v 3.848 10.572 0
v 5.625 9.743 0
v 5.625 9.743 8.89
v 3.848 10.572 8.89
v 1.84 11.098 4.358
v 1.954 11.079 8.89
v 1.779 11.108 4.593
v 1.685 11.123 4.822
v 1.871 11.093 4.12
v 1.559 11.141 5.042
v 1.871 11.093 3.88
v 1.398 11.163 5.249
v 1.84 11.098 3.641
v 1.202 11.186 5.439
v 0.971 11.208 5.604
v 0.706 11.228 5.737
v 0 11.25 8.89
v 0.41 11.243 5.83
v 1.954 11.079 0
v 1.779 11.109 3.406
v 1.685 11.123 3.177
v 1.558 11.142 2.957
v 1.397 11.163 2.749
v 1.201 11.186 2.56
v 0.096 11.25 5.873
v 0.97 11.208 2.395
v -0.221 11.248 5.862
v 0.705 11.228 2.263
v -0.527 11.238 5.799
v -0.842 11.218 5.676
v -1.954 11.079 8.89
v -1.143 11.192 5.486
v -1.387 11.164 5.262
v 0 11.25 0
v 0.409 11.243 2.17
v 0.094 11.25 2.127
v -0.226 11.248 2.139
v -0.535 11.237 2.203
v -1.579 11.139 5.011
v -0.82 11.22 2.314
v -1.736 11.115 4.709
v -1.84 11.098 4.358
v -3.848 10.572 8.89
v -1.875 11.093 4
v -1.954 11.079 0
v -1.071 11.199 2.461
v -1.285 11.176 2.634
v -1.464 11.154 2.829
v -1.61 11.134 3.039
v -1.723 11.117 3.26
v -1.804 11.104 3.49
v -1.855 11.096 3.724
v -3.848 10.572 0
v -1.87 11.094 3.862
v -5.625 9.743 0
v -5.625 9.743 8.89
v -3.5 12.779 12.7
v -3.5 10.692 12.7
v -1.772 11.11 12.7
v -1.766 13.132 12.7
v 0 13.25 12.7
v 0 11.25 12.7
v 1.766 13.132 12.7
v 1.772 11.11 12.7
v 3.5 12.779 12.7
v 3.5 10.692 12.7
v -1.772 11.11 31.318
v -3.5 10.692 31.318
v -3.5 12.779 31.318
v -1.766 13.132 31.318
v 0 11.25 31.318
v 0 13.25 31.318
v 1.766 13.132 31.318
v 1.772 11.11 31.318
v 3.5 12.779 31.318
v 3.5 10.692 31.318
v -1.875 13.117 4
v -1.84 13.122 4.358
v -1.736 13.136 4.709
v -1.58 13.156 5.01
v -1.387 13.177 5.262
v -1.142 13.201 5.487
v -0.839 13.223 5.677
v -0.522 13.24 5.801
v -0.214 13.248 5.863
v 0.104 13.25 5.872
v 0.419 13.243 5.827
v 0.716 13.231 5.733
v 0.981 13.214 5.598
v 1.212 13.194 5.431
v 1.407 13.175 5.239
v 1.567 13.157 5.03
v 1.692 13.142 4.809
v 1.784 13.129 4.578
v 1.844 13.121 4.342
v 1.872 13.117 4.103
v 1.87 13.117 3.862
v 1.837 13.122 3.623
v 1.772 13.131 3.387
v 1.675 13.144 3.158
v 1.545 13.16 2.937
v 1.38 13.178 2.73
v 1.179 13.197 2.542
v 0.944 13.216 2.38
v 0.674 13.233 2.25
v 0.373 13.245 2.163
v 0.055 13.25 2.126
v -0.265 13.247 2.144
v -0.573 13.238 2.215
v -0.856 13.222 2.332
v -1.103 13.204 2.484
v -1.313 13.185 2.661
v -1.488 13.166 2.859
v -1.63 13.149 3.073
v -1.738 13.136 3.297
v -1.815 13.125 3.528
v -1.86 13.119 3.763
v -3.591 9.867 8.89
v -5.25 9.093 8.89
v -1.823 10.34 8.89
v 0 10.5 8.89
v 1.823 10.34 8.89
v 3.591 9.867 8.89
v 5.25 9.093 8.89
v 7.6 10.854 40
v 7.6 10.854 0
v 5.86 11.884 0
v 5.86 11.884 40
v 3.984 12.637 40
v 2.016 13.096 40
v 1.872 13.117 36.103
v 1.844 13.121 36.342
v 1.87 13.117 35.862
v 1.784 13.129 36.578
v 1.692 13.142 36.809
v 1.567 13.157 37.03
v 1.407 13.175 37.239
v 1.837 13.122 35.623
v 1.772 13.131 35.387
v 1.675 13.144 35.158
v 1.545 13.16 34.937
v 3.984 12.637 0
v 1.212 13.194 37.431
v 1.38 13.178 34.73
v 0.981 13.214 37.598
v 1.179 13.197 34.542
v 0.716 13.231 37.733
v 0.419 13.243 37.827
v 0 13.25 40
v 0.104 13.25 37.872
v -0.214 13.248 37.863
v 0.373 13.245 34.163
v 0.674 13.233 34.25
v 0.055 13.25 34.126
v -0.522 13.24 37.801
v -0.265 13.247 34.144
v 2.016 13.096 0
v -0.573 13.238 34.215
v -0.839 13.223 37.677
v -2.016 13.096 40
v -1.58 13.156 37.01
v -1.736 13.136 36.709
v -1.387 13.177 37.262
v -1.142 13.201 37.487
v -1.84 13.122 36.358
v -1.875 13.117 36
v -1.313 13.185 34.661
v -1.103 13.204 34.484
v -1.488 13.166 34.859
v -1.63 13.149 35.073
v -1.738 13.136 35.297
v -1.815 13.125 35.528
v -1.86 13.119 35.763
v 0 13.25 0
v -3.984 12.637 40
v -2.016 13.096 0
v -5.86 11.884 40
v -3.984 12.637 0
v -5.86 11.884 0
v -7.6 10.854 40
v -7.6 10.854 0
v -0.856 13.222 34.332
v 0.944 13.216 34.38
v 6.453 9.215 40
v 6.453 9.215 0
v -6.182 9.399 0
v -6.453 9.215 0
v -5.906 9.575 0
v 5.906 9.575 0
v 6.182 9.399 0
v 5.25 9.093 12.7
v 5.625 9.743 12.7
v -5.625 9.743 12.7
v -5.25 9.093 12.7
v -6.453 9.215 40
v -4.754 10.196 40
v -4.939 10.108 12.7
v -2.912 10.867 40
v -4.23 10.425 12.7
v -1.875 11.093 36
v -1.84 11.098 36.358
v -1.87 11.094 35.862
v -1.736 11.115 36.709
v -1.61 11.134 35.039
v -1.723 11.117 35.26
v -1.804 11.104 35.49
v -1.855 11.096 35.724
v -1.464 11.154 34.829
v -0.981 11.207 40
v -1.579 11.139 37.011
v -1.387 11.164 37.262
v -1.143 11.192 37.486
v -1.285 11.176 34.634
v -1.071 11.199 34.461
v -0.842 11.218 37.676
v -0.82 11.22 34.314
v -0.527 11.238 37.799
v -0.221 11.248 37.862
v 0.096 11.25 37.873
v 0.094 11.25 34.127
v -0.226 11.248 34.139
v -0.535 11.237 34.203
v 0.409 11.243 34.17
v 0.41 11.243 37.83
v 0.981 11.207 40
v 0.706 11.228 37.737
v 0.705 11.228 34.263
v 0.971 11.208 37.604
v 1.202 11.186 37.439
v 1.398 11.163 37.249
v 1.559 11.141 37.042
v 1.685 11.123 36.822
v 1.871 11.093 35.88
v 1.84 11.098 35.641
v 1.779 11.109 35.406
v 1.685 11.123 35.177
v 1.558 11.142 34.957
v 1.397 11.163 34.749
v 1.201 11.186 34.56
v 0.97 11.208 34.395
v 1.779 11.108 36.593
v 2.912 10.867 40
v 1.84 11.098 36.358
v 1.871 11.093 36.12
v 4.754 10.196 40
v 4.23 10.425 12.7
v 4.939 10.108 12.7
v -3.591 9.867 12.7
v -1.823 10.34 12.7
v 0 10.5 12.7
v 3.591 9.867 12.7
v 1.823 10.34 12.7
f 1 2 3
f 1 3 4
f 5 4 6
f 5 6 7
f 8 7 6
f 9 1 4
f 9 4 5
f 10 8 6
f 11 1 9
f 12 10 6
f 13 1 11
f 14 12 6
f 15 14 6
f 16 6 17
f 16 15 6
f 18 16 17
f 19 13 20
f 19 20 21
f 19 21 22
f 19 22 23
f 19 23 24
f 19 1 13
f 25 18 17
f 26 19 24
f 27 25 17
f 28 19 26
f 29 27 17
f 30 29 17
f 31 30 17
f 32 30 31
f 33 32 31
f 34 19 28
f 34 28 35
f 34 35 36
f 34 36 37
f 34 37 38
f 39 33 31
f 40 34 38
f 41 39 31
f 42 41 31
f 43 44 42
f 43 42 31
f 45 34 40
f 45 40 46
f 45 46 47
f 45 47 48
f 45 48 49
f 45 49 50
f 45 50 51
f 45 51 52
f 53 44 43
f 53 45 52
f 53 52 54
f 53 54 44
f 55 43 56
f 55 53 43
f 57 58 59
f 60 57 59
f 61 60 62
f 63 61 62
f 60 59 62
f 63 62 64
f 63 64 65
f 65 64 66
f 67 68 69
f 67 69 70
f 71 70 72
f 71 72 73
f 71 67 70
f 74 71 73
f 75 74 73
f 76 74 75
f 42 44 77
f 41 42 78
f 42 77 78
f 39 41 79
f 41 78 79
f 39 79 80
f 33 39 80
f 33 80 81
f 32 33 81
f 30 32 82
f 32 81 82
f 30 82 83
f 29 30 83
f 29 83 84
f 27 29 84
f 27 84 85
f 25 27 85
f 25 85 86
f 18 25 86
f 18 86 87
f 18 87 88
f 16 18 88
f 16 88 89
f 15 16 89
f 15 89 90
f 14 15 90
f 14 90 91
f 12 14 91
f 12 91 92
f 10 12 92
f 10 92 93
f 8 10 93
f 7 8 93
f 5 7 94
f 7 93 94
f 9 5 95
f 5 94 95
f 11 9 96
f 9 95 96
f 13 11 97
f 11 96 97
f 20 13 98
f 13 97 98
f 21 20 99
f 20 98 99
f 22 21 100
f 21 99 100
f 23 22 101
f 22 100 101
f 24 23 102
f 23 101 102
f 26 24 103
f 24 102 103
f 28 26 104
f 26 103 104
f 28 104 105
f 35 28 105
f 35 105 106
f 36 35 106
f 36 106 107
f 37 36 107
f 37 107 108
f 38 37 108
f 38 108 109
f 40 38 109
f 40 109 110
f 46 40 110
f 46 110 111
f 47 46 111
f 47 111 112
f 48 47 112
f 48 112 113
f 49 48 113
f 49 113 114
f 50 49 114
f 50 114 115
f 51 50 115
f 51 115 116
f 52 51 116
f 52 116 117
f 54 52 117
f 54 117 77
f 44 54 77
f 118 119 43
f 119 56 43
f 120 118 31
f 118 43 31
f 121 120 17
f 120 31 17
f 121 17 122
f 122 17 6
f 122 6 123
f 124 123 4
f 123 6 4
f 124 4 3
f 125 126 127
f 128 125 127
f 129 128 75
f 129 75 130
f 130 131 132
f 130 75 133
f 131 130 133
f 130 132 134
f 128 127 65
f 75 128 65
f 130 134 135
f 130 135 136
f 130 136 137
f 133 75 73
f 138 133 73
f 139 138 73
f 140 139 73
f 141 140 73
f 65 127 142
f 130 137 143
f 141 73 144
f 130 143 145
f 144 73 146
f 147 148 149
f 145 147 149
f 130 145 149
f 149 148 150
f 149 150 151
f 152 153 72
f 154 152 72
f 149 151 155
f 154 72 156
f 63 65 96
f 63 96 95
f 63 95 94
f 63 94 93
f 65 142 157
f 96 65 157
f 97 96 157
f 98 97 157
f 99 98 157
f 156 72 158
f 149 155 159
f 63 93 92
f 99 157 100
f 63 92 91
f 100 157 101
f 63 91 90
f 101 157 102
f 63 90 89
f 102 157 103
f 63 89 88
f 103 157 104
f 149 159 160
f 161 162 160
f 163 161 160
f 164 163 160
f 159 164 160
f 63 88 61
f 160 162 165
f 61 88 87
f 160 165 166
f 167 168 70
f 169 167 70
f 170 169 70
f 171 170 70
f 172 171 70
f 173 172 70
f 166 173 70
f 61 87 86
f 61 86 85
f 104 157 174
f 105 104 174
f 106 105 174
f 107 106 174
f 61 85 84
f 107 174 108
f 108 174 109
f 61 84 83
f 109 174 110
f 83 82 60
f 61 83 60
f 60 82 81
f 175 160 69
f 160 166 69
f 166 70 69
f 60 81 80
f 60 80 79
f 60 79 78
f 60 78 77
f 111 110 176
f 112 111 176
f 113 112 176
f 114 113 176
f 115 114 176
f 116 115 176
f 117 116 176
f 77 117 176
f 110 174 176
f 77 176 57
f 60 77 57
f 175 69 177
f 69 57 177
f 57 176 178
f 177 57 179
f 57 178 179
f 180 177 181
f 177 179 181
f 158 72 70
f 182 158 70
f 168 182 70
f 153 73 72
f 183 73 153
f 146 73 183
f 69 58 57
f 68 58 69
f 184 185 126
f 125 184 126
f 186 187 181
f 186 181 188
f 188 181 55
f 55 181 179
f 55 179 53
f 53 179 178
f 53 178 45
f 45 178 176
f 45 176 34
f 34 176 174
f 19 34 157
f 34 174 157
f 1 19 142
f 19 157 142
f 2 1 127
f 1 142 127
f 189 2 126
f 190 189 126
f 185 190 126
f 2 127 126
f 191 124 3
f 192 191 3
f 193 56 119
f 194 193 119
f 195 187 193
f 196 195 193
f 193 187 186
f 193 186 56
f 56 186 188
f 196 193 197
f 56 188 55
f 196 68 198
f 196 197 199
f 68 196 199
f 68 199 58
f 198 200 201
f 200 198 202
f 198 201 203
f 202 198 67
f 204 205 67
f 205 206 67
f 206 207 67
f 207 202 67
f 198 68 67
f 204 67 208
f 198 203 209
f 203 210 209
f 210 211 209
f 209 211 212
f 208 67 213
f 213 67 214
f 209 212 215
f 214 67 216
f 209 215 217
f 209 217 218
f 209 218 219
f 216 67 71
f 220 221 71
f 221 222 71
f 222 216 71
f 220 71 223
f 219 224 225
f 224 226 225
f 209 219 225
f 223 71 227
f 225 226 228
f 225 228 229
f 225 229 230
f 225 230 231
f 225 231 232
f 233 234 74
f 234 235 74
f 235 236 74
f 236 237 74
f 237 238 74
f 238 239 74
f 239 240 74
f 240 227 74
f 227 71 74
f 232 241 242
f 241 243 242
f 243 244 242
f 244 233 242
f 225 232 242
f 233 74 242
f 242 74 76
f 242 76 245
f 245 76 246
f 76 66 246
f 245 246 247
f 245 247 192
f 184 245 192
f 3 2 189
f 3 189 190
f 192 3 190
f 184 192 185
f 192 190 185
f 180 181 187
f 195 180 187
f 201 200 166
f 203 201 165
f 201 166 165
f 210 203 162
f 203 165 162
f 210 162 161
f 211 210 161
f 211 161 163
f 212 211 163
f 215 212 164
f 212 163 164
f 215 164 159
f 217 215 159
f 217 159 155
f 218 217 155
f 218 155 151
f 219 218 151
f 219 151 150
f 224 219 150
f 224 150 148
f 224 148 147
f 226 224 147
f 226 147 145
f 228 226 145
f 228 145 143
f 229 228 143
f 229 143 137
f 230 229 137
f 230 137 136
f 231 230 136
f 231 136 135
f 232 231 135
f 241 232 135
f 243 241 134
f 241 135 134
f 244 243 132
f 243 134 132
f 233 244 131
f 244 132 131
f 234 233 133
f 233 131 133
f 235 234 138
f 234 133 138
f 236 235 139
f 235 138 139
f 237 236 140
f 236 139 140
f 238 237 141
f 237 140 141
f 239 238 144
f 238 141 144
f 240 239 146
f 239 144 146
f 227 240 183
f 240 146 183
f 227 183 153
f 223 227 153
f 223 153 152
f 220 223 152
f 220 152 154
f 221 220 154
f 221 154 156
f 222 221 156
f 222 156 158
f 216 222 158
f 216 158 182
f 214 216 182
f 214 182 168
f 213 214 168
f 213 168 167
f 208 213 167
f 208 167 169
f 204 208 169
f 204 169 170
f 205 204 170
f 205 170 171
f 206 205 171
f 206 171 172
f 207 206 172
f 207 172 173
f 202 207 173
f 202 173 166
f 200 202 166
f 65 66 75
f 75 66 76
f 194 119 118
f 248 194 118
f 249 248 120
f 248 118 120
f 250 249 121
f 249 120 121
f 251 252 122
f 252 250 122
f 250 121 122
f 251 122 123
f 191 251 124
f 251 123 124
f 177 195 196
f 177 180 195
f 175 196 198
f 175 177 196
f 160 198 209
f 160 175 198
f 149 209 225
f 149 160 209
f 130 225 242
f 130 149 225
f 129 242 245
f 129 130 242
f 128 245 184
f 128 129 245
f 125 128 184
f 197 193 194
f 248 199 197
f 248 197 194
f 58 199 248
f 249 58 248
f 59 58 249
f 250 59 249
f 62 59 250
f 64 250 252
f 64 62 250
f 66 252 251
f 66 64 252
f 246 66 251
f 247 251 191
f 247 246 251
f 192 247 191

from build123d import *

# Parameters (mm, degrees)
F1_DEPTH = 40
F3_DEPTH = 12.7
F4_DEPTH = 8.89
F6_D     = 3.75
F7_W     = 7
F7_H     = 18.618289
F8_DEPTH = 25.4


with BuildPart() as f1:
    # F0 (on Top) → F1 (new body)
    with BuildSketch(Plane.XY):
        with BuildLine():
            ThreePointArc((-6.452735, 9.21546), (0, 11.25), (6.452735, 9.21546))
            Line((6.452735, 9.21546), (7.599888, 10.853765))
            ThreePointArc((7.599888, 10.853765), (0, 13.25), (-7.599888, 10.853765))
            Line((-7.599888, 10.853765), (-6.452735, 9.21546))
        make_face()
    extrude(amount=F1_DEPTH)

    # F2 (on Top) → F3 (join)
    with BuildSketch(Plane.XY):
        with BuildLine():
            ThreePointArc((-5.25, 9.093267), (0, 10.5), (5.25, 9.093267))
            Line((5.25, 9.093267), (5.625, 9.742786))
            ThreePointArc((5.625, 9.742786), (0, 11.25), (-5.625, 9.742786))
            Line((-5.625, 9.742786), (-5.25, 9.093267))
        make_face()
    extrude(amount=F3_DEPTH)

    # F2 (on Top) → F4 (cut)
    with BuildSketch(Plane.XY):
        with BuildLine():
            ThreePointArc((-5.25, 9.093267), (0, 10.5), (5.25, 9.093267))
            Line((5.25, 9.093267), (5.625, 9.742786))
            ThreePointArc((5.625, 9.742786), (0, 11.25), (-5.625, 9.742786))
            Line((-5.625, 9.742786), (-5.25, 9.093267))
        make_face()
    extrude(amount=F4_DEPTH, mode=Mode.SUBTRACT)

    # F6 (through all)
    with Locations(Plane.XZ):
        with Locations((0, 36), (0, 4)):
            Hole(F6_D / 2)

    # F7 (on Front) → F8 (cut)
    with BuildSketch(Plane.XZ):
        with Locations((0, 22.009144)):
            Rectangle(F7_W, F7_H)
    extrude(amount=-F8_DEPTH, mode=Mode.SUBTRACT)


solid = f1.part
